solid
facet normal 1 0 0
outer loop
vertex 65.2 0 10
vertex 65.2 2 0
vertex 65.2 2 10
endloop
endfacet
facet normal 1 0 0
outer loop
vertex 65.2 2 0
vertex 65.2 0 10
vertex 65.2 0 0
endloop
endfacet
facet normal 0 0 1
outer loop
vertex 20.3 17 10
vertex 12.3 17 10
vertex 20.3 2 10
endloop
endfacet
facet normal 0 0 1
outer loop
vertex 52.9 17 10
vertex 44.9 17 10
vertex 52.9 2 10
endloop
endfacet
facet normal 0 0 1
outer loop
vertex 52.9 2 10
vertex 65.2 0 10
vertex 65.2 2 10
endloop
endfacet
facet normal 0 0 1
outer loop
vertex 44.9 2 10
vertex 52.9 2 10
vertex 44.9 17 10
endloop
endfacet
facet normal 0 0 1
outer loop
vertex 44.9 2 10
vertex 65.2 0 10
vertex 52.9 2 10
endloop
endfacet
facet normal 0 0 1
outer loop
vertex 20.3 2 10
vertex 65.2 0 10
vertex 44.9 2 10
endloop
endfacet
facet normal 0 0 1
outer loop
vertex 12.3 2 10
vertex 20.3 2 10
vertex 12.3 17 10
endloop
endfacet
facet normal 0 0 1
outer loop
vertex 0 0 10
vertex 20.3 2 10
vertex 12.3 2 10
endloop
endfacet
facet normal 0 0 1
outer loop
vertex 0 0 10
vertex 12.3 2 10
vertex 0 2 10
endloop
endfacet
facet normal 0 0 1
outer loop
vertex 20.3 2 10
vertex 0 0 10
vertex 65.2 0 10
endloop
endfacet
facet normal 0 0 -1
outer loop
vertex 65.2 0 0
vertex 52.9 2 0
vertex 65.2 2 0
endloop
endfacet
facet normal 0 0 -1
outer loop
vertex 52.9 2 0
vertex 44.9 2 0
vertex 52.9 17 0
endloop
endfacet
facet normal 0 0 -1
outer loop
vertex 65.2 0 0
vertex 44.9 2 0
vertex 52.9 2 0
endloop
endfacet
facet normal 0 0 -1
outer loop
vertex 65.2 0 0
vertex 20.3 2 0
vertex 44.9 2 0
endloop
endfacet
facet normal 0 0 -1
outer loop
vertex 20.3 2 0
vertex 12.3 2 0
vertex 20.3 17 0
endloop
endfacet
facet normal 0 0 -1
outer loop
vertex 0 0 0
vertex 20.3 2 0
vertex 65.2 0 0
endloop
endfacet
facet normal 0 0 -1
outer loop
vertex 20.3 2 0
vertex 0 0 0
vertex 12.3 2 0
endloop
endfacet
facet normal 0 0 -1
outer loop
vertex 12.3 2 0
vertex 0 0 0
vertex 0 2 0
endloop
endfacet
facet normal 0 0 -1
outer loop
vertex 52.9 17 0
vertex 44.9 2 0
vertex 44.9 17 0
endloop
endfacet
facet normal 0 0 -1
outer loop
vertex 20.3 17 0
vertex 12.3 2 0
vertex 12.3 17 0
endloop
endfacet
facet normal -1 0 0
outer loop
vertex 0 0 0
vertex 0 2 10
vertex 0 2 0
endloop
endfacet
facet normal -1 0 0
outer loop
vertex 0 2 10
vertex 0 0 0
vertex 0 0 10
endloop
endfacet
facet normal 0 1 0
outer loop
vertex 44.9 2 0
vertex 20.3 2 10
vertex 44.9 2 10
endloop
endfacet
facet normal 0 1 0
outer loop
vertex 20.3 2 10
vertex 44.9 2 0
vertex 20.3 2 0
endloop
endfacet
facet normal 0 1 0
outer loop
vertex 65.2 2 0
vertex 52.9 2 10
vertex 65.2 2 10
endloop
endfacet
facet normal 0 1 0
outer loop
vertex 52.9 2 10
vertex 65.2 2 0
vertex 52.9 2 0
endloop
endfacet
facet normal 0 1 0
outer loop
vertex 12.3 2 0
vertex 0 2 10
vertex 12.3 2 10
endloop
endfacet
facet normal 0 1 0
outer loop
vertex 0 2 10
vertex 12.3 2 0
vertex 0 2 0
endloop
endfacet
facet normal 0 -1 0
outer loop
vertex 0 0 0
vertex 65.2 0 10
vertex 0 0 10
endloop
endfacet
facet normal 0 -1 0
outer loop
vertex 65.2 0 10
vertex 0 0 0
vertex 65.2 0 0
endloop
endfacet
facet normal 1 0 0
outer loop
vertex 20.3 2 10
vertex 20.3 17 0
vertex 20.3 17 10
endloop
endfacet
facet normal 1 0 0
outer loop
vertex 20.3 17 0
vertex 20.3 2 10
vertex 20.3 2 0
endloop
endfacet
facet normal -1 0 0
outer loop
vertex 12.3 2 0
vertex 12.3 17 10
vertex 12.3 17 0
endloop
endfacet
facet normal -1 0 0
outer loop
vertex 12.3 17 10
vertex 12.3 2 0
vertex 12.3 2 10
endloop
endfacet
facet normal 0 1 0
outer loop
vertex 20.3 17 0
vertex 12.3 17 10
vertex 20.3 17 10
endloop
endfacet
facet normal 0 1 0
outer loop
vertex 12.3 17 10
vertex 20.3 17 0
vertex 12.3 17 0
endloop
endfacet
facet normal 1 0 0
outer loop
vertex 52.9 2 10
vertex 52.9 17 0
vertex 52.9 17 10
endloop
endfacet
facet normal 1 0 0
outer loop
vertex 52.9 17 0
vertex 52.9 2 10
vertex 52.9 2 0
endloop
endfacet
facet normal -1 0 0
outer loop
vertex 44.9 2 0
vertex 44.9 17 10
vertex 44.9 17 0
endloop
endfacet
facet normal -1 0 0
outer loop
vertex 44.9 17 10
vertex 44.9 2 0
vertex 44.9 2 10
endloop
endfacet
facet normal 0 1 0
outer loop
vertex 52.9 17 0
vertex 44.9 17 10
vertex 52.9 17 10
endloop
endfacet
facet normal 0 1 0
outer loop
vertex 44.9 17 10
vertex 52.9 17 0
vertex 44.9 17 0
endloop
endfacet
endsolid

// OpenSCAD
depth = 10;
rib_width = 24.6;
insert_width = 8;
insert_height = 15;
flat_width = 2*(rib_width+insert_width);
flat_height = 2;

cube([flat_width, flat_height, depth]);
translate([0.5*rib_width, flat_height, 0]) cube([insert_width, insert_height, depth]);
translate([1.5*rib_width+insert_width, flat_height, 0]) cube([insert_width, insert_height, depth]);
